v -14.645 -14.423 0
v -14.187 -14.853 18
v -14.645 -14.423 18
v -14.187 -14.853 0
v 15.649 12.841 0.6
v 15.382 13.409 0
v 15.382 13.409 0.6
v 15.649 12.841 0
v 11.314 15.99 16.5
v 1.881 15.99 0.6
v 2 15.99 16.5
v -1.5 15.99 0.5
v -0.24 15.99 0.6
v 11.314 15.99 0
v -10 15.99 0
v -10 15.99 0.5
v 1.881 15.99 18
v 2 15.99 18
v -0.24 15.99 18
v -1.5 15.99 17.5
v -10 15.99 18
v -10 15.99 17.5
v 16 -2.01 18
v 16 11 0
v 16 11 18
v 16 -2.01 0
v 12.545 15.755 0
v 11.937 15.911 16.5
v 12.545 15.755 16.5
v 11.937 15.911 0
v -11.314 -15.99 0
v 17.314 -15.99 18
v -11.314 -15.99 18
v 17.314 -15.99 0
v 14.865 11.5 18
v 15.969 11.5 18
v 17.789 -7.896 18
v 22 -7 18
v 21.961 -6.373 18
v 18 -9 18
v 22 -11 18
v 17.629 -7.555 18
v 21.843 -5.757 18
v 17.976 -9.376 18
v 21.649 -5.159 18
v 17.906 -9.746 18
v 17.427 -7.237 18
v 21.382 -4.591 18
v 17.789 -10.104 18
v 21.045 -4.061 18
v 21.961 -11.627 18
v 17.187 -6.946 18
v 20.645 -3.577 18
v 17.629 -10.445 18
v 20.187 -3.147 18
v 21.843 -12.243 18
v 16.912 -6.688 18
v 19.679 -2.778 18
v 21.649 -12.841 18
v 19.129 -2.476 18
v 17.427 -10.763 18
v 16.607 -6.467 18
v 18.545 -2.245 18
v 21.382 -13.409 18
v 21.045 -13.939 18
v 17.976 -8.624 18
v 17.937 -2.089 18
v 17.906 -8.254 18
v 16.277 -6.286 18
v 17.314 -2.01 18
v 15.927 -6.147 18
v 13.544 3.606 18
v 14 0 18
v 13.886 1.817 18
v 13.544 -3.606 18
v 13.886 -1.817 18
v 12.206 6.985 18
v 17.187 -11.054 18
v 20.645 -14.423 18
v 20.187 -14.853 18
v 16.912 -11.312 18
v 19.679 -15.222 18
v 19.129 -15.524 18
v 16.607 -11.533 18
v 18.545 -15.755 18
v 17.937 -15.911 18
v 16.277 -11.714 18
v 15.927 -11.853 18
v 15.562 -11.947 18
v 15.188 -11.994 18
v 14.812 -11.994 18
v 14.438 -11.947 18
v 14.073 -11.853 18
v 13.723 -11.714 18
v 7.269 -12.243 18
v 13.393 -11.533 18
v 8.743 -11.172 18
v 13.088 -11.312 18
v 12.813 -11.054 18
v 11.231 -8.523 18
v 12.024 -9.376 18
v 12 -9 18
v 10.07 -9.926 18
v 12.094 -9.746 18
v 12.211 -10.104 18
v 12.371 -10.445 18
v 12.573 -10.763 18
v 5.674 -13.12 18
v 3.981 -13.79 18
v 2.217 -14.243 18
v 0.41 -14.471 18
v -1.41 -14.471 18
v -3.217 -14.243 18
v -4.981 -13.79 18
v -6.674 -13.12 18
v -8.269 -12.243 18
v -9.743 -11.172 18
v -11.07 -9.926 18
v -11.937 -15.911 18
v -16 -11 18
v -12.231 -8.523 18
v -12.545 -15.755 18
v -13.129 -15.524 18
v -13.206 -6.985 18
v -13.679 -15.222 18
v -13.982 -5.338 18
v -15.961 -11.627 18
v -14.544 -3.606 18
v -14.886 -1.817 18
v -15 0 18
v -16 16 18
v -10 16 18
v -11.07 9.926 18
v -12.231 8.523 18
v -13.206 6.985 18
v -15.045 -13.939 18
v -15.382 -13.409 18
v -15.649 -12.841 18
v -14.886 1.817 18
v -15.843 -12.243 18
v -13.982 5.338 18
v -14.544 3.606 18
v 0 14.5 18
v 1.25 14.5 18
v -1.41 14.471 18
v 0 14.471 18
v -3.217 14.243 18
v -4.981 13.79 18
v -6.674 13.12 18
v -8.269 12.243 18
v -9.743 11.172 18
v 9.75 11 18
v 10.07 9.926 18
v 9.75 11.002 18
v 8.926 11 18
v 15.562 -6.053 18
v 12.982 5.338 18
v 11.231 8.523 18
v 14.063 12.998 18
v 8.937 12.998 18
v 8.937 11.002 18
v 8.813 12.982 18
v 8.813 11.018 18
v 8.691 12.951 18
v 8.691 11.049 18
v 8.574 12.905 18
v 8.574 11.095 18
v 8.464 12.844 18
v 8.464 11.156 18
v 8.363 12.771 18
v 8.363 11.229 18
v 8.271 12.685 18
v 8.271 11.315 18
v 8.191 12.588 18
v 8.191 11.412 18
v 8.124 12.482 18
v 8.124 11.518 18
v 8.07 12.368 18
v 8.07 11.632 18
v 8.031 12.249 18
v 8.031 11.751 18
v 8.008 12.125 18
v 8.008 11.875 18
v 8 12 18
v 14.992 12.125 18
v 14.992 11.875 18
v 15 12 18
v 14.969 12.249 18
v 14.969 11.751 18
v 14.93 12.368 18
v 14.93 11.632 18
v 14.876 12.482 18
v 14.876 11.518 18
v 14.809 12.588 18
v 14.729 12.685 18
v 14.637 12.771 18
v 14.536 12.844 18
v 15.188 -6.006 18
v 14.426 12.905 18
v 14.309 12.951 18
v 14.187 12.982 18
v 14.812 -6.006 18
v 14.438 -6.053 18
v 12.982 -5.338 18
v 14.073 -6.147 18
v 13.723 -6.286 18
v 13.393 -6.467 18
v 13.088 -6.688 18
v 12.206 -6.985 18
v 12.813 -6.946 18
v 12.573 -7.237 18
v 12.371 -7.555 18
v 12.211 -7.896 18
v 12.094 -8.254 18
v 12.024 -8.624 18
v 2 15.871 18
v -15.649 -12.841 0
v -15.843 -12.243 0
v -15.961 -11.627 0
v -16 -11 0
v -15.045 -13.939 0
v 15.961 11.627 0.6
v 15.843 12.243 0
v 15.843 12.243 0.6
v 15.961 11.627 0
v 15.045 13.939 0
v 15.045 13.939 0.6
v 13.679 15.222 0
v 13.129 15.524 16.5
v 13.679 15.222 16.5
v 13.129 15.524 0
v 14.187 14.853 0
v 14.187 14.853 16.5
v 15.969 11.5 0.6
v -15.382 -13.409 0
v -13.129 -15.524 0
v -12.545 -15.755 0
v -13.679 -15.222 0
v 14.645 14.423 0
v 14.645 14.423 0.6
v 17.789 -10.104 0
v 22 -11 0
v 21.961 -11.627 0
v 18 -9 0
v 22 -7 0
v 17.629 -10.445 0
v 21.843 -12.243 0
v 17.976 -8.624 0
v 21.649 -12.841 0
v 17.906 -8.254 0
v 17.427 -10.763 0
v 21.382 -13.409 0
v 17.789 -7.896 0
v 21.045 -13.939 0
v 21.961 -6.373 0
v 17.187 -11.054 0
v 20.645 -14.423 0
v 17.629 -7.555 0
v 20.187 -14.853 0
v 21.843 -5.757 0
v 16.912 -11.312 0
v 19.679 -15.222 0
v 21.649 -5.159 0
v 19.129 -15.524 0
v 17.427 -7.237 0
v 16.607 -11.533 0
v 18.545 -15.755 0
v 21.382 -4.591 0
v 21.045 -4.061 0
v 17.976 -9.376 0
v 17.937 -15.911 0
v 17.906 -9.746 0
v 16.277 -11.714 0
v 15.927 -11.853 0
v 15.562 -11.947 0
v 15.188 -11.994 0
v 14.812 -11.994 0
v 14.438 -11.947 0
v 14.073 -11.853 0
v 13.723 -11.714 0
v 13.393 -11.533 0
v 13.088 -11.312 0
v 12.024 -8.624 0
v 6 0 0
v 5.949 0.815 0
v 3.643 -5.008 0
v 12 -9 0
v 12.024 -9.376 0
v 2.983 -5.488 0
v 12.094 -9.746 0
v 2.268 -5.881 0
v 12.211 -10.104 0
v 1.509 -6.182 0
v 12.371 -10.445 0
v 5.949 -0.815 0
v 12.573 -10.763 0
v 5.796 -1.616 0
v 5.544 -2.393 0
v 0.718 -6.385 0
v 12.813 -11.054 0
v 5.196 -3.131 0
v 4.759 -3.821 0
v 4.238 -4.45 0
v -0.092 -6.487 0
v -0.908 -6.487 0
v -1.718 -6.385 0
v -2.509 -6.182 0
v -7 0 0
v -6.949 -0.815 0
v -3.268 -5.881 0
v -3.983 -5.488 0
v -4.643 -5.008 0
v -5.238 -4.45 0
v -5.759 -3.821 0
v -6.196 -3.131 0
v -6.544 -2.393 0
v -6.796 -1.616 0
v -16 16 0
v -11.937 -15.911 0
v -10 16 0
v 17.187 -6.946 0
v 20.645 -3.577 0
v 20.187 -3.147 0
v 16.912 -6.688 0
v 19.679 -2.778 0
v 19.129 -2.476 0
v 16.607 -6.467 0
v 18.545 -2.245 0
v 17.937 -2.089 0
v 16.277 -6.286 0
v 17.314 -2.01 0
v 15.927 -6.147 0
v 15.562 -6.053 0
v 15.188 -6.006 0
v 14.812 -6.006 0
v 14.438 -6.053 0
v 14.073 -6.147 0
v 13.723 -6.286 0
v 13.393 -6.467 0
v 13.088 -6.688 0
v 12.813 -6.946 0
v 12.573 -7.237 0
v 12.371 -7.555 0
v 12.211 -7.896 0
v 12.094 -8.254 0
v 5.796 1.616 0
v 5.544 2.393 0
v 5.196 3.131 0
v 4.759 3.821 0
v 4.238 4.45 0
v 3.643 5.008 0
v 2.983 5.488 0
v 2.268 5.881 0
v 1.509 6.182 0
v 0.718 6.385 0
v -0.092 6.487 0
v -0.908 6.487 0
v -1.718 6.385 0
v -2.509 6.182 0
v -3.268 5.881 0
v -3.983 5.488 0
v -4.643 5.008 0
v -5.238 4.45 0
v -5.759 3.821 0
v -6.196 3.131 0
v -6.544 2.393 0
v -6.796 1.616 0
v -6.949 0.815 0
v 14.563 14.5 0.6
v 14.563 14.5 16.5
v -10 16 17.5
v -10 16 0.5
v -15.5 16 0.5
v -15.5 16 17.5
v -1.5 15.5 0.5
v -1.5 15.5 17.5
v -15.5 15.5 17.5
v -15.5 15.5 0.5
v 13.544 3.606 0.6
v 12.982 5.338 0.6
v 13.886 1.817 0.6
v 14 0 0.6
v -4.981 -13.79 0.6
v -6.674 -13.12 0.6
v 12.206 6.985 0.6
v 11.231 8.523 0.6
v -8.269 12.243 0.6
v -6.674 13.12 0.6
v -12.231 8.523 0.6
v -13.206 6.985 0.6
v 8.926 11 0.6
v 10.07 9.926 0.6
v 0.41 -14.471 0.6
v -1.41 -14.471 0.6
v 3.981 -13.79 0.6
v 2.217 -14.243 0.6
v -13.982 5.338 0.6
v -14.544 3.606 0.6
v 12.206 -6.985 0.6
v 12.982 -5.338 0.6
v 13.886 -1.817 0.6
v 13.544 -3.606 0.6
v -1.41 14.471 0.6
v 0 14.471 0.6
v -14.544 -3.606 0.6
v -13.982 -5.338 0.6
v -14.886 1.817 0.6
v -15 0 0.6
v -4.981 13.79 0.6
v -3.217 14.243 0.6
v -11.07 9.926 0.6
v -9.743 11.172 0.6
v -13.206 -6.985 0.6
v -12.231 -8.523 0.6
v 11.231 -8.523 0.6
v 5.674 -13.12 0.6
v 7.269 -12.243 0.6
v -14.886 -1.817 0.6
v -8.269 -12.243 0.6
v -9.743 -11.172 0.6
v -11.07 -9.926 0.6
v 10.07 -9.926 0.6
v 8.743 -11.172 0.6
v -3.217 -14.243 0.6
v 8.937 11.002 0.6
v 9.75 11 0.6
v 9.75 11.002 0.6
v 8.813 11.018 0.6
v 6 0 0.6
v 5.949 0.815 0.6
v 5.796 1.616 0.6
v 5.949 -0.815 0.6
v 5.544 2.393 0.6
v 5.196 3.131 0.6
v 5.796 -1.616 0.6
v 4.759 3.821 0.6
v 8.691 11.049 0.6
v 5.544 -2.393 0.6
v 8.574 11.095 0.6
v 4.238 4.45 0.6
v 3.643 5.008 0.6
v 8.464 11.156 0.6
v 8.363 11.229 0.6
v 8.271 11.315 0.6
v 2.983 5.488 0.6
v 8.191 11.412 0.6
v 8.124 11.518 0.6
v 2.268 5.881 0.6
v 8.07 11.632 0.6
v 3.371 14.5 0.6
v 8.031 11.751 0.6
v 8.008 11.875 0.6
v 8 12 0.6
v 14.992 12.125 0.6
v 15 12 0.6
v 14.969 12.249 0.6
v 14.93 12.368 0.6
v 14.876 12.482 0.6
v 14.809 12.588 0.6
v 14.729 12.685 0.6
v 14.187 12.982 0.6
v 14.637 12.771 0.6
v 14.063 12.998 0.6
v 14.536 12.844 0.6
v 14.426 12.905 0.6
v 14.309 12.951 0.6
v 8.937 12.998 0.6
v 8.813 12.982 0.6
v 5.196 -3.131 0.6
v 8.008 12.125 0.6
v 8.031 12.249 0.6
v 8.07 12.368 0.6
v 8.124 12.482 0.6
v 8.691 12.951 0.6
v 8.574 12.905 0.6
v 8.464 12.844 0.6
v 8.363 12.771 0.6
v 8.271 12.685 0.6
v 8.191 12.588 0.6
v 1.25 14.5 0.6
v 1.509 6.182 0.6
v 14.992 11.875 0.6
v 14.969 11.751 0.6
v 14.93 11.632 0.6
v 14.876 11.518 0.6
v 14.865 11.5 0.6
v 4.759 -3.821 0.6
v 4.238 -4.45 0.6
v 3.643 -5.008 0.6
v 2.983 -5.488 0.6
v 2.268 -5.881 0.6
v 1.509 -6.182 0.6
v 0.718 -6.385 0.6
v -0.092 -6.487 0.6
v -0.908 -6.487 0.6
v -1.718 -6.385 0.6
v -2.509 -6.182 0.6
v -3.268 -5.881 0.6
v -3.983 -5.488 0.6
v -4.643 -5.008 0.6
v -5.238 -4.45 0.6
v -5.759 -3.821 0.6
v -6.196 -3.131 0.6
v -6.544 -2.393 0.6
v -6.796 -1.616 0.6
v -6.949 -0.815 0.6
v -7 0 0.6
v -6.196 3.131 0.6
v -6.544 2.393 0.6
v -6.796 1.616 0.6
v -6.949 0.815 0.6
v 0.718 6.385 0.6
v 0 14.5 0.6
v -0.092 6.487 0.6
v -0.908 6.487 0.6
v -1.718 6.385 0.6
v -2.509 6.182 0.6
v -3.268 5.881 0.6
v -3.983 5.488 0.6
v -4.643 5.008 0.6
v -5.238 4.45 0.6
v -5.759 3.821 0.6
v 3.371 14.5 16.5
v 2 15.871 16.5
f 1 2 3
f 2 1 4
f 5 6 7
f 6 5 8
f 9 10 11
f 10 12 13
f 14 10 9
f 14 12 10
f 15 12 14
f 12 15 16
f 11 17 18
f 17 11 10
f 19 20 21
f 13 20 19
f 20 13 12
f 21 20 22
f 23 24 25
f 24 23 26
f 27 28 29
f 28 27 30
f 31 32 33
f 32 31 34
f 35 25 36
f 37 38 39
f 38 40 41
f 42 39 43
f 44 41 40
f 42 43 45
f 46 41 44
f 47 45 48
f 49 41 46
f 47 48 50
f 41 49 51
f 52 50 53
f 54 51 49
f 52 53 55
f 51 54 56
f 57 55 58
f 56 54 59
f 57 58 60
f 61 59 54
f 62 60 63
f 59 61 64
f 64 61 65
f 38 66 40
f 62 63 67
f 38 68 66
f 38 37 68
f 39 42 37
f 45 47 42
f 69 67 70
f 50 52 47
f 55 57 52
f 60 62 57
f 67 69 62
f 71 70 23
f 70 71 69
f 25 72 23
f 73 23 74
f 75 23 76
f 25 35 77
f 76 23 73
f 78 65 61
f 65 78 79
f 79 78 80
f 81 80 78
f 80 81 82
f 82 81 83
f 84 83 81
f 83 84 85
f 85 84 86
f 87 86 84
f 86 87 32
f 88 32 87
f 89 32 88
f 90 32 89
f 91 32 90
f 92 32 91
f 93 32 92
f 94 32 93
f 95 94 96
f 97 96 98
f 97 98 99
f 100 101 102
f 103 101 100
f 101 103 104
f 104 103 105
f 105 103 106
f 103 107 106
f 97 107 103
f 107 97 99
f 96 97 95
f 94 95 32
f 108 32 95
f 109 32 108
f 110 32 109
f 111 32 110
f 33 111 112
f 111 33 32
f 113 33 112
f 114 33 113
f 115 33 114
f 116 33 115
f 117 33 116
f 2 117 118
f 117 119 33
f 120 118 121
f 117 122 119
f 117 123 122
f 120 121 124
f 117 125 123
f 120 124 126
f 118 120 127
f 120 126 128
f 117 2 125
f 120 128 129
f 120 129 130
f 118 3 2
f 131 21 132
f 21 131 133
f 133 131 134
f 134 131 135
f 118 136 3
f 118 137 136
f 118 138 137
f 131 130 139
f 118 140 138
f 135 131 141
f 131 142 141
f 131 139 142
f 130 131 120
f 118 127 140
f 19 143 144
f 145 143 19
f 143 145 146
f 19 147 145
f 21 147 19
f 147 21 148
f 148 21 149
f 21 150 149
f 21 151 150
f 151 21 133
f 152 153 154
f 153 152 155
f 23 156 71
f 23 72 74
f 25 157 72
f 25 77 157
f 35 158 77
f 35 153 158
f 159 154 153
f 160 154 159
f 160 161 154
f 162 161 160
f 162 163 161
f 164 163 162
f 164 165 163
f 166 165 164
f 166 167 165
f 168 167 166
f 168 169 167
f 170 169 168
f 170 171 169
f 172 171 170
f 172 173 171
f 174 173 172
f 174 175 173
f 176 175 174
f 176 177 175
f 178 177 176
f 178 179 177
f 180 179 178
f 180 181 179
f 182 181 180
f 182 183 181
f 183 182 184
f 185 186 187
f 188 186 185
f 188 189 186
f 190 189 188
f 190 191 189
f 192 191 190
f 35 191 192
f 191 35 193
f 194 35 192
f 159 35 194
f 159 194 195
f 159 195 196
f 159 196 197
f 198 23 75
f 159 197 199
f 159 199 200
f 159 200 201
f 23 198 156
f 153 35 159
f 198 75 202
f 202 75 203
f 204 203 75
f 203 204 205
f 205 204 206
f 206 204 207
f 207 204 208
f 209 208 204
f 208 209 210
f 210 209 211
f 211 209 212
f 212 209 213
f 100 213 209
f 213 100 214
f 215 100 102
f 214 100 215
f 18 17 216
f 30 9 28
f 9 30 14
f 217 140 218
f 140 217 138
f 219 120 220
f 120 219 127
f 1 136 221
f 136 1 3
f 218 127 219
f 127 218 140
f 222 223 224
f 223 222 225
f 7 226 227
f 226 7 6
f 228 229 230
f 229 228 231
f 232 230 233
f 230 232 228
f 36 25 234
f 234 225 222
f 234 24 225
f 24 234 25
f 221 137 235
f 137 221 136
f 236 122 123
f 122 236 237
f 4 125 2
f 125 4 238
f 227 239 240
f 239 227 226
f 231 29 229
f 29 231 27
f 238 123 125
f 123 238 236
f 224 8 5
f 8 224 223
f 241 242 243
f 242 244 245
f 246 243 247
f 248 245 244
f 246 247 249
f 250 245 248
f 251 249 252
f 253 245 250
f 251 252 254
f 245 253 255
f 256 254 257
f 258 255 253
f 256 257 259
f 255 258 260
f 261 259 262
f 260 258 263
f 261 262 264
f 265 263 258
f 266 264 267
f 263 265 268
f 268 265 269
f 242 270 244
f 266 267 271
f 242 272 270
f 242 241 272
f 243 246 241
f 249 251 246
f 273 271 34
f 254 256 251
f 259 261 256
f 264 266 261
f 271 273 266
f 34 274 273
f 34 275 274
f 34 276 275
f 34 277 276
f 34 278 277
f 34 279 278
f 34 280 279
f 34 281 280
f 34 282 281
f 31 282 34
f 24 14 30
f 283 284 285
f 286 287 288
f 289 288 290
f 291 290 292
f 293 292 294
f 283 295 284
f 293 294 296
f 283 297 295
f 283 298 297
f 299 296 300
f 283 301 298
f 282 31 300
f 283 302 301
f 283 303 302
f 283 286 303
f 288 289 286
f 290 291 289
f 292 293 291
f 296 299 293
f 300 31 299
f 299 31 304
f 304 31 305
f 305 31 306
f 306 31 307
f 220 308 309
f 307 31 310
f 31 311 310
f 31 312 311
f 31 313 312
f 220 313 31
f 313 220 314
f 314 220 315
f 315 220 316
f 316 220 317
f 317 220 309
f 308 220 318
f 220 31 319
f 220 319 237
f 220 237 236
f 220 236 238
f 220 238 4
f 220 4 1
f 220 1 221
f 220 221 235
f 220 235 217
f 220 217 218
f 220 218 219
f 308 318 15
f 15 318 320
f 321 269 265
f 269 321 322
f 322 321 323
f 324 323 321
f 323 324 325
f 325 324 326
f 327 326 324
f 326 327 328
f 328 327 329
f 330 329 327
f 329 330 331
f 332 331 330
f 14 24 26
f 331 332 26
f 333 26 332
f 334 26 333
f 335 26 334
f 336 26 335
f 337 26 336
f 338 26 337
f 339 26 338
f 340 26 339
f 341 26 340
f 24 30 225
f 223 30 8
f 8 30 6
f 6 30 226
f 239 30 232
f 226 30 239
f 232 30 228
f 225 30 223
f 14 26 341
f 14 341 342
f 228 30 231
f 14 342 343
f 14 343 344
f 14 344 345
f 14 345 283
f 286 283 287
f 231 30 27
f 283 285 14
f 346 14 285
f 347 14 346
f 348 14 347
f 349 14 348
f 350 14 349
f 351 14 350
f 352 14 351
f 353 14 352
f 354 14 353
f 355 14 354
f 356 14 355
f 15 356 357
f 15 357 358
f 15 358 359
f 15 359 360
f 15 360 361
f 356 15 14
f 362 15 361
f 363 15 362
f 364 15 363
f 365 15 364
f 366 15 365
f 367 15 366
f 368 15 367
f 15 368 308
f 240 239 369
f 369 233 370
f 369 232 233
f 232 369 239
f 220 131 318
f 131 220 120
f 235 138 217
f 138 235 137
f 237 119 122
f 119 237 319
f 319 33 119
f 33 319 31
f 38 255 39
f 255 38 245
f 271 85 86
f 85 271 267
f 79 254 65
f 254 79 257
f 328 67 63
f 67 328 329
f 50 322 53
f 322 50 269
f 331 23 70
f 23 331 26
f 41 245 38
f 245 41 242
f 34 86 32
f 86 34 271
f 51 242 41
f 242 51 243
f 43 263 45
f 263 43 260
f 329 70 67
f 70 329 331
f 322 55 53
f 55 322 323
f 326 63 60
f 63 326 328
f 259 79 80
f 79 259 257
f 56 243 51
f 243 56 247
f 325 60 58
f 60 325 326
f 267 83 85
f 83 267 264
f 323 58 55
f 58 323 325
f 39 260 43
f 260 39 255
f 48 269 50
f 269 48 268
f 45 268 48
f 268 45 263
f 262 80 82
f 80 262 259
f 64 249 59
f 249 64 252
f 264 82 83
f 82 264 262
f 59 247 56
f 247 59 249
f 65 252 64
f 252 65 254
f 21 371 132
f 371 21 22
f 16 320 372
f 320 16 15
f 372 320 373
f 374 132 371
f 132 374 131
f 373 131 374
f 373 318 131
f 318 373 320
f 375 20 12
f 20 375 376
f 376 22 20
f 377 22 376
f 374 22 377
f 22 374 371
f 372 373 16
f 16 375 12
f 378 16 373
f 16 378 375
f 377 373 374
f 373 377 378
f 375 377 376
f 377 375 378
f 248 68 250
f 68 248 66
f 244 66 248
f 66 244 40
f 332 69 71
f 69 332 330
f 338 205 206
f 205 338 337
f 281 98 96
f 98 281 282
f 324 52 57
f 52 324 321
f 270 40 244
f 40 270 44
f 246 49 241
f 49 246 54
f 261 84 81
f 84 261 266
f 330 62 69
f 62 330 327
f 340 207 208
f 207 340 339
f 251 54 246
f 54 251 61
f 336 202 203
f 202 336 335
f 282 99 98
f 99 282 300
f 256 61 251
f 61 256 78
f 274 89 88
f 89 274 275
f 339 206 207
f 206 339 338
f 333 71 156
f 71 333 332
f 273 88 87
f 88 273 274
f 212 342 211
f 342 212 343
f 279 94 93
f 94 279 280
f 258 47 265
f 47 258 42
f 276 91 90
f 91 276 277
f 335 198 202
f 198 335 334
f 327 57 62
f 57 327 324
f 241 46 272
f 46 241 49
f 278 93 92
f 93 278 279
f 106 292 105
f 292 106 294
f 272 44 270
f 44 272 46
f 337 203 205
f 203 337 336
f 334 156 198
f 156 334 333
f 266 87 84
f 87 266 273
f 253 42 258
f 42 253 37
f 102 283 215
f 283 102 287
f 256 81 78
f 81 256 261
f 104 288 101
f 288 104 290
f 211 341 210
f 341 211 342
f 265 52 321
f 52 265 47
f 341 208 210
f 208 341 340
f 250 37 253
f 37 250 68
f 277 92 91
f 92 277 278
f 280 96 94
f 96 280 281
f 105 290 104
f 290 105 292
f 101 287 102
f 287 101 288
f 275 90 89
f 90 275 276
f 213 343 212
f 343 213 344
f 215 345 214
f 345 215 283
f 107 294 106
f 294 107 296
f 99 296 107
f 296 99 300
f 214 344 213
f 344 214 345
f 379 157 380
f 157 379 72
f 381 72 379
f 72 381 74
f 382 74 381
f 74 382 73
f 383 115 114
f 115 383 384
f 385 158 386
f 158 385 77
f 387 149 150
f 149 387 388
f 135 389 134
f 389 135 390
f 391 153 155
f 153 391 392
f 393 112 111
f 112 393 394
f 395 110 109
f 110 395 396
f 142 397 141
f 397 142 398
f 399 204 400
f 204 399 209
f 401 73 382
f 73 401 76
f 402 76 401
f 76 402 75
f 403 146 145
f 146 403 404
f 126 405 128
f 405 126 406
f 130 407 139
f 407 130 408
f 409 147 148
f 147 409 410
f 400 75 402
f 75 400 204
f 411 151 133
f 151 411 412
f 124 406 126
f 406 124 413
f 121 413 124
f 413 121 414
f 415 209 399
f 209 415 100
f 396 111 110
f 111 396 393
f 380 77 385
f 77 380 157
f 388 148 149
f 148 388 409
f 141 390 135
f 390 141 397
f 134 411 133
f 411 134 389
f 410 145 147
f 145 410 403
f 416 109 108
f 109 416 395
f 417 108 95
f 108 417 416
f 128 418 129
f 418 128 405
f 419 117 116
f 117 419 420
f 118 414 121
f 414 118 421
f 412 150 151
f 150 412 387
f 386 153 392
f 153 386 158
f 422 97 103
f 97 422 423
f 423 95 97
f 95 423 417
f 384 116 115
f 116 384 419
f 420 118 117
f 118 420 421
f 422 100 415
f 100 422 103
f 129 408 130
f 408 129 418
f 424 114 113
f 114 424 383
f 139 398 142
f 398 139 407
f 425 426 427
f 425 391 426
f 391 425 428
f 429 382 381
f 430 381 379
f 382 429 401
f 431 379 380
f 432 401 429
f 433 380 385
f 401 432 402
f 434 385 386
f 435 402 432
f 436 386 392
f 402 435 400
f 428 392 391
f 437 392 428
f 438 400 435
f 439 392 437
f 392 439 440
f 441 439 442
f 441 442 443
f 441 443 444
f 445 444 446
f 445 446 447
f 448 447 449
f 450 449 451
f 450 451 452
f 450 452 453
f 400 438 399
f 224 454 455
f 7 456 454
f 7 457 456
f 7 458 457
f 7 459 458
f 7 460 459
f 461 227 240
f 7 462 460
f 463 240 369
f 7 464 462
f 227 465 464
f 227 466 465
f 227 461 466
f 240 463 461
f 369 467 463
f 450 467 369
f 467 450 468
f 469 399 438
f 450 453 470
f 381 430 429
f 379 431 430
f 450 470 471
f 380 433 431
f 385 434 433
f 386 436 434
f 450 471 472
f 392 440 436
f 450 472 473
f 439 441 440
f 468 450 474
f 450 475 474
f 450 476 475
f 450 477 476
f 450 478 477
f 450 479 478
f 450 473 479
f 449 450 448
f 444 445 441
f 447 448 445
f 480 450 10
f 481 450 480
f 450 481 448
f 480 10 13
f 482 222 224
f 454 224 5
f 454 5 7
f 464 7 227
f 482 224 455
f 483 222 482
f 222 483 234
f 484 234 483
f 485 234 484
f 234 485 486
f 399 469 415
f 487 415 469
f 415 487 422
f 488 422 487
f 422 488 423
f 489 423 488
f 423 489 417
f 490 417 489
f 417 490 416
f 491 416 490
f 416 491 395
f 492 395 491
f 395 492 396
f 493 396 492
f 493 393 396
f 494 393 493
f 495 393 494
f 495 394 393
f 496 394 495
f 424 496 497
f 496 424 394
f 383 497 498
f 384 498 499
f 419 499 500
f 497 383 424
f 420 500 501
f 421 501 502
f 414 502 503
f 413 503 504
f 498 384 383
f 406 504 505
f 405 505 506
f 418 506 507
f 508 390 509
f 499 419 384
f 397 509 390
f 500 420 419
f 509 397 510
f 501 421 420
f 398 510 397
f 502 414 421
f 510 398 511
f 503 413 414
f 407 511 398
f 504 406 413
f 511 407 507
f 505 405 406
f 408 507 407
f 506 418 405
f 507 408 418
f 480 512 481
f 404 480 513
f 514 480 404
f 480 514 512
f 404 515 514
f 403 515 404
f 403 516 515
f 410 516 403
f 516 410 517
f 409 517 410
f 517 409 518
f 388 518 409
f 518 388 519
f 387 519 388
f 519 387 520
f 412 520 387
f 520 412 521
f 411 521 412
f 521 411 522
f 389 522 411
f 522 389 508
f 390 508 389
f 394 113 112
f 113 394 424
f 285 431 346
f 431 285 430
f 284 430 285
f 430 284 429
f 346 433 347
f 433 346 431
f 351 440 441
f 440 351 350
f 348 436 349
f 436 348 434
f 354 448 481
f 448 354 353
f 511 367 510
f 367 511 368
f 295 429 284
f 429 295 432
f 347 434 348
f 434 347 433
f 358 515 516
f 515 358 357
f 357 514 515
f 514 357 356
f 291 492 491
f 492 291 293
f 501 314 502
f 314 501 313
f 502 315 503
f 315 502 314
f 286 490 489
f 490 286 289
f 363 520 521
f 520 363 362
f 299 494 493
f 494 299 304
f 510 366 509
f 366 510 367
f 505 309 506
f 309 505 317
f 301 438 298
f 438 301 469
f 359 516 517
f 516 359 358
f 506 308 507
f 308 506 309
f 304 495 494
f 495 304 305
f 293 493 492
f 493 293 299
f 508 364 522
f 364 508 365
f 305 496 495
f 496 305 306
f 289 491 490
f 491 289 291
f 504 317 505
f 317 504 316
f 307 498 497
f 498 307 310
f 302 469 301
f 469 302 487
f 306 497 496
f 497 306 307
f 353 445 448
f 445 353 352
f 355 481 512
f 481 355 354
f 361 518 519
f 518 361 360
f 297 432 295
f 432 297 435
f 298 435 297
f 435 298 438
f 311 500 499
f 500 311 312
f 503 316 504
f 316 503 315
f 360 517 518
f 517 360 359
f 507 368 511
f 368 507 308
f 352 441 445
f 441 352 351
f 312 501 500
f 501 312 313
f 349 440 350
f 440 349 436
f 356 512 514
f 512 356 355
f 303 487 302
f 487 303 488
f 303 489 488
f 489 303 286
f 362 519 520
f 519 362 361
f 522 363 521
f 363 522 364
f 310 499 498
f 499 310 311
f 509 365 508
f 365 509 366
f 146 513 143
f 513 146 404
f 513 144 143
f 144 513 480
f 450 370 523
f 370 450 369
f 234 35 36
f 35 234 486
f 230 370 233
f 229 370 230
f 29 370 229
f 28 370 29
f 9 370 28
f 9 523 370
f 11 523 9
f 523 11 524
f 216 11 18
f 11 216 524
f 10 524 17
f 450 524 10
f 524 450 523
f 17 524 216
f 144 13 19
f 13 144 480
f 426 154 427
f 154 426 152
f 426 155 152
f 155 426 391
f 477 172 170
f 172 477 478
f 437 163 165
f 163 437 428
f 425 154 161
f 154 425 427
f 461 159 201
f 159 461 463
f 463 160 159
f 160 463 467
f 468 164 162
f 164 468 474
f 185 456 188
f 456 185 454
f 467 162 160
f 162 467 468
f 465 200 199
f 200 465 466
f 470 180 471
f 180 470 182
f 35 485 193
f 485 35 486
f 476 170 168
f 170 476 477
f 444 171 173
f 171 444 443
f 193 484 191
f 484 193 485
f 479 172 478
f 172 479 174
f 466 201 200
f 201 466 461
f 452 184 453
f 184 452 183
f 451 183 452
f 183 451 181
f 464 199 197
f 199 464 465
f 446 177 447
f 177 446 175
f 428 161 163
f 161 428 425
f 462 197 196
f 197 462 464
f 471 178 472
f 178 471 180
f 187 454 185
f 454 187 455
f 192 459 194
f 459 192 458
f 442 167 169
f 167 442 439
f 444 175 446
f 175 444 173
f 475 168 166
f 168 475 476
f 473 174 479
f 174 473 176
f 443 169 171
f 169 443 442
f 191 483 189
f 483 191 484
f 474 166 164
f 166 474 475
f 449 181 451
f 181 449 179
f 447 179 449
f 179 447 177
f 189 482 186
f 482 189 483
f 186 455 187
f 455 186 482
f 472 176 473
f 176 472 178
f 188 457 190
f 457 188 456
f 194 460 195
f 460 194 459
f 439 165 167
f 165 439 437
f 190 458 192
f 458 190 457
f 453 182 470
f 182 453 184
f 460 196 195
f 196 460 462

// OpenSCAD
$fn = 50;


union() {
	difference() {
		union() {
			translate(v = [0, 0, 0]) {
				rotate(a = [0, 0, 0]) {
					hull() {
						translate(v = [-11.0000000000, 11.0000000000, 0]) {
							rotate(a = [0, 0, 0]) {
								translate(v = [0, 0, 0]) {
									rotate(a = [0, 0, 0]) {
										cylinder(h = 18, r = 5);
									}
								}
							}
						}
						translate(v = [11.0000000000, 11.0000000000, 0]) {
							rotate(a = [0, 0, 0]) {
								translate(v = [0, 0, 0]) {
									rotate(a = [0, 0, 0]) {
										cylinder(h = 18, r = 5);
									}
								}
							}
						}
						translate(v = [-11.0000000000, -11.0000000000, 0]) {
							rotate(a = [0, 0, 0]) {
								translate(v = [0, 0, 0]) {
									rotate(a = [0, 0, 0]) {
										cylinder(h = 18, r = 5);
									}
								}
							}
						}
						translate(v = [11.0000000000, -11.0000000000, 0]) {
							rotate(a = [0, 0, 0]) {
								translate(v = [0, 0, 0]) {
									rotate(a = [0, 0, 0]) {
										cylinder(h = 18, r = 5);
									}
								}
							}
						}
					}
				}
			}
			translate(v = [7.5000000000, -9.0000000000, 0]) {
				rotate(a = [0, 0, 0]) {
					hull() {
						translate(v = [-9.5000000000, 2.0000000000, 0]) {
							rotate(a = [0, 0, 0]) {
								translate(v = [0, 0, 0]) {
									rotate(a = [0, 0, 0]) {
										cylinder(h = 18, r = 5);
									}
								}
							}
						}
						translate(v = [9.5000000000, 2.0000000000, 0]) {
							rotate(a = [0, 0, 0]) {
								translate(v = [0, 0, 0]) {
									rotate(a = [0, 0, 0]) {
										cylinder(h = 18, r = 5);
									}
								}
							}
						}
						translate(v = [-9.5000000000, -2.0000000000, 0]) {
							rotate(a = [0, 0, 0]) {
								translate(v = [0, 0, 0]) {
									rotate(a = [0, 0, 0]) {
										cylinder(h = 18, r = 5);
									}
								}
							}
						}
						translate(v = [9.5000000000, -2.0000000000, 0]) {
							rotate(a = [0, 0, 0]) {
								translate(v = [0, 0, 0]) {
									rotate(a = [0, 0, 0]) {
										cylinder(h = 18, r = 5);
									}
								}
							}
						}
					}
				}
			}
			translate(v = [-16.0000000000, 10.0000000000, 0]) {
				rotate(a = [0, 0, 0]) {
					cube(size = [6, 6, 18]);
				}
			}
		}
		union() {
			translate(v = [-15.5000000000, 15.5000000000, 0.5000000000]) {
				rotate(a = [0, 0, 0]) {
					cube(size = [14, 0.5000000000, 17.0000000000]);
				}
			}
			translate(v = [15.0000000000, -9.0000000000, -125.0000000000]) {
				rotate(a = [0, 0, 0]) {
					cylinder(h = 250, r = 3.0000000000);
				}
			}
			translate(v = [-0.5000000000, 0.0000000000, 0.6000000000]) {
				rotate(a = [0, 0, 0]) {
					cylinder(h = 20.4000000000, r = 14.5000000000);
				}
			}
			translate(v = [-0.5000000000, 0.0000000000, -9.0000000000]) {
				rotate(a = [0, 0, 0]) {
					cylinder(h = 18, r = 6.5000000000);
				}
			}
			translate(v = [0.0000000000, 11.5000000000, 0.6000000000]) {
				rotate(a = [0, 0, 0]) {
					cube(size = [16.0000000000, 3, 20.4000000000]);
				}
			}
			translate(v = [2.0000000000, 11.5000000000, 16.5000000000]) {
				rotate(a = [0, 0, 0]) {
					cube(size = [14.0000000000, 6, 1.5000000000]);
				}
			}
			translate(v = [-3.0000000000, 18.7500000000, 0.6000000000]) {
				rotate(a = [0, 0, -45]) {
					cube(size = [10, 1.5000000000, 20.4000000000]);
				}
			}
			translate(v = [2.2500000000, 11.0000000000, 0.6000000000]) {
				rotate(a = [0, 0, 0]) {
					cube(size = [7.5000000000, 2, 17.4000000000]);
				}
			}
		}
	}
	union() {
		translate(v = [11.5000000000, 12, 0]) {
			rotate(a = [0, 0, 0]) {
				hull() {
					translate(v = [2.5000000000, 0, 0]) {
						rotate(a = [0, 0, 0]) {
							translate(v = [0, 0, 0]) {
								rotate(a = [0, 0, 0]) {
									cylinder(h = 18, r = 1.0000000000);
								}
							}
						}
					}
					translate(v = [-2.5000000000, 0, 0]) {
						rotate(a = [0, 0, 0]) {
							translate(v = [0, 0, 0]) {
								rotate(a = [0, 0, 0]) {
									cylinder(h = 18, r = 1.0000000000);
								}
							}
						}
					}
				}
			}
		}
	}
}
